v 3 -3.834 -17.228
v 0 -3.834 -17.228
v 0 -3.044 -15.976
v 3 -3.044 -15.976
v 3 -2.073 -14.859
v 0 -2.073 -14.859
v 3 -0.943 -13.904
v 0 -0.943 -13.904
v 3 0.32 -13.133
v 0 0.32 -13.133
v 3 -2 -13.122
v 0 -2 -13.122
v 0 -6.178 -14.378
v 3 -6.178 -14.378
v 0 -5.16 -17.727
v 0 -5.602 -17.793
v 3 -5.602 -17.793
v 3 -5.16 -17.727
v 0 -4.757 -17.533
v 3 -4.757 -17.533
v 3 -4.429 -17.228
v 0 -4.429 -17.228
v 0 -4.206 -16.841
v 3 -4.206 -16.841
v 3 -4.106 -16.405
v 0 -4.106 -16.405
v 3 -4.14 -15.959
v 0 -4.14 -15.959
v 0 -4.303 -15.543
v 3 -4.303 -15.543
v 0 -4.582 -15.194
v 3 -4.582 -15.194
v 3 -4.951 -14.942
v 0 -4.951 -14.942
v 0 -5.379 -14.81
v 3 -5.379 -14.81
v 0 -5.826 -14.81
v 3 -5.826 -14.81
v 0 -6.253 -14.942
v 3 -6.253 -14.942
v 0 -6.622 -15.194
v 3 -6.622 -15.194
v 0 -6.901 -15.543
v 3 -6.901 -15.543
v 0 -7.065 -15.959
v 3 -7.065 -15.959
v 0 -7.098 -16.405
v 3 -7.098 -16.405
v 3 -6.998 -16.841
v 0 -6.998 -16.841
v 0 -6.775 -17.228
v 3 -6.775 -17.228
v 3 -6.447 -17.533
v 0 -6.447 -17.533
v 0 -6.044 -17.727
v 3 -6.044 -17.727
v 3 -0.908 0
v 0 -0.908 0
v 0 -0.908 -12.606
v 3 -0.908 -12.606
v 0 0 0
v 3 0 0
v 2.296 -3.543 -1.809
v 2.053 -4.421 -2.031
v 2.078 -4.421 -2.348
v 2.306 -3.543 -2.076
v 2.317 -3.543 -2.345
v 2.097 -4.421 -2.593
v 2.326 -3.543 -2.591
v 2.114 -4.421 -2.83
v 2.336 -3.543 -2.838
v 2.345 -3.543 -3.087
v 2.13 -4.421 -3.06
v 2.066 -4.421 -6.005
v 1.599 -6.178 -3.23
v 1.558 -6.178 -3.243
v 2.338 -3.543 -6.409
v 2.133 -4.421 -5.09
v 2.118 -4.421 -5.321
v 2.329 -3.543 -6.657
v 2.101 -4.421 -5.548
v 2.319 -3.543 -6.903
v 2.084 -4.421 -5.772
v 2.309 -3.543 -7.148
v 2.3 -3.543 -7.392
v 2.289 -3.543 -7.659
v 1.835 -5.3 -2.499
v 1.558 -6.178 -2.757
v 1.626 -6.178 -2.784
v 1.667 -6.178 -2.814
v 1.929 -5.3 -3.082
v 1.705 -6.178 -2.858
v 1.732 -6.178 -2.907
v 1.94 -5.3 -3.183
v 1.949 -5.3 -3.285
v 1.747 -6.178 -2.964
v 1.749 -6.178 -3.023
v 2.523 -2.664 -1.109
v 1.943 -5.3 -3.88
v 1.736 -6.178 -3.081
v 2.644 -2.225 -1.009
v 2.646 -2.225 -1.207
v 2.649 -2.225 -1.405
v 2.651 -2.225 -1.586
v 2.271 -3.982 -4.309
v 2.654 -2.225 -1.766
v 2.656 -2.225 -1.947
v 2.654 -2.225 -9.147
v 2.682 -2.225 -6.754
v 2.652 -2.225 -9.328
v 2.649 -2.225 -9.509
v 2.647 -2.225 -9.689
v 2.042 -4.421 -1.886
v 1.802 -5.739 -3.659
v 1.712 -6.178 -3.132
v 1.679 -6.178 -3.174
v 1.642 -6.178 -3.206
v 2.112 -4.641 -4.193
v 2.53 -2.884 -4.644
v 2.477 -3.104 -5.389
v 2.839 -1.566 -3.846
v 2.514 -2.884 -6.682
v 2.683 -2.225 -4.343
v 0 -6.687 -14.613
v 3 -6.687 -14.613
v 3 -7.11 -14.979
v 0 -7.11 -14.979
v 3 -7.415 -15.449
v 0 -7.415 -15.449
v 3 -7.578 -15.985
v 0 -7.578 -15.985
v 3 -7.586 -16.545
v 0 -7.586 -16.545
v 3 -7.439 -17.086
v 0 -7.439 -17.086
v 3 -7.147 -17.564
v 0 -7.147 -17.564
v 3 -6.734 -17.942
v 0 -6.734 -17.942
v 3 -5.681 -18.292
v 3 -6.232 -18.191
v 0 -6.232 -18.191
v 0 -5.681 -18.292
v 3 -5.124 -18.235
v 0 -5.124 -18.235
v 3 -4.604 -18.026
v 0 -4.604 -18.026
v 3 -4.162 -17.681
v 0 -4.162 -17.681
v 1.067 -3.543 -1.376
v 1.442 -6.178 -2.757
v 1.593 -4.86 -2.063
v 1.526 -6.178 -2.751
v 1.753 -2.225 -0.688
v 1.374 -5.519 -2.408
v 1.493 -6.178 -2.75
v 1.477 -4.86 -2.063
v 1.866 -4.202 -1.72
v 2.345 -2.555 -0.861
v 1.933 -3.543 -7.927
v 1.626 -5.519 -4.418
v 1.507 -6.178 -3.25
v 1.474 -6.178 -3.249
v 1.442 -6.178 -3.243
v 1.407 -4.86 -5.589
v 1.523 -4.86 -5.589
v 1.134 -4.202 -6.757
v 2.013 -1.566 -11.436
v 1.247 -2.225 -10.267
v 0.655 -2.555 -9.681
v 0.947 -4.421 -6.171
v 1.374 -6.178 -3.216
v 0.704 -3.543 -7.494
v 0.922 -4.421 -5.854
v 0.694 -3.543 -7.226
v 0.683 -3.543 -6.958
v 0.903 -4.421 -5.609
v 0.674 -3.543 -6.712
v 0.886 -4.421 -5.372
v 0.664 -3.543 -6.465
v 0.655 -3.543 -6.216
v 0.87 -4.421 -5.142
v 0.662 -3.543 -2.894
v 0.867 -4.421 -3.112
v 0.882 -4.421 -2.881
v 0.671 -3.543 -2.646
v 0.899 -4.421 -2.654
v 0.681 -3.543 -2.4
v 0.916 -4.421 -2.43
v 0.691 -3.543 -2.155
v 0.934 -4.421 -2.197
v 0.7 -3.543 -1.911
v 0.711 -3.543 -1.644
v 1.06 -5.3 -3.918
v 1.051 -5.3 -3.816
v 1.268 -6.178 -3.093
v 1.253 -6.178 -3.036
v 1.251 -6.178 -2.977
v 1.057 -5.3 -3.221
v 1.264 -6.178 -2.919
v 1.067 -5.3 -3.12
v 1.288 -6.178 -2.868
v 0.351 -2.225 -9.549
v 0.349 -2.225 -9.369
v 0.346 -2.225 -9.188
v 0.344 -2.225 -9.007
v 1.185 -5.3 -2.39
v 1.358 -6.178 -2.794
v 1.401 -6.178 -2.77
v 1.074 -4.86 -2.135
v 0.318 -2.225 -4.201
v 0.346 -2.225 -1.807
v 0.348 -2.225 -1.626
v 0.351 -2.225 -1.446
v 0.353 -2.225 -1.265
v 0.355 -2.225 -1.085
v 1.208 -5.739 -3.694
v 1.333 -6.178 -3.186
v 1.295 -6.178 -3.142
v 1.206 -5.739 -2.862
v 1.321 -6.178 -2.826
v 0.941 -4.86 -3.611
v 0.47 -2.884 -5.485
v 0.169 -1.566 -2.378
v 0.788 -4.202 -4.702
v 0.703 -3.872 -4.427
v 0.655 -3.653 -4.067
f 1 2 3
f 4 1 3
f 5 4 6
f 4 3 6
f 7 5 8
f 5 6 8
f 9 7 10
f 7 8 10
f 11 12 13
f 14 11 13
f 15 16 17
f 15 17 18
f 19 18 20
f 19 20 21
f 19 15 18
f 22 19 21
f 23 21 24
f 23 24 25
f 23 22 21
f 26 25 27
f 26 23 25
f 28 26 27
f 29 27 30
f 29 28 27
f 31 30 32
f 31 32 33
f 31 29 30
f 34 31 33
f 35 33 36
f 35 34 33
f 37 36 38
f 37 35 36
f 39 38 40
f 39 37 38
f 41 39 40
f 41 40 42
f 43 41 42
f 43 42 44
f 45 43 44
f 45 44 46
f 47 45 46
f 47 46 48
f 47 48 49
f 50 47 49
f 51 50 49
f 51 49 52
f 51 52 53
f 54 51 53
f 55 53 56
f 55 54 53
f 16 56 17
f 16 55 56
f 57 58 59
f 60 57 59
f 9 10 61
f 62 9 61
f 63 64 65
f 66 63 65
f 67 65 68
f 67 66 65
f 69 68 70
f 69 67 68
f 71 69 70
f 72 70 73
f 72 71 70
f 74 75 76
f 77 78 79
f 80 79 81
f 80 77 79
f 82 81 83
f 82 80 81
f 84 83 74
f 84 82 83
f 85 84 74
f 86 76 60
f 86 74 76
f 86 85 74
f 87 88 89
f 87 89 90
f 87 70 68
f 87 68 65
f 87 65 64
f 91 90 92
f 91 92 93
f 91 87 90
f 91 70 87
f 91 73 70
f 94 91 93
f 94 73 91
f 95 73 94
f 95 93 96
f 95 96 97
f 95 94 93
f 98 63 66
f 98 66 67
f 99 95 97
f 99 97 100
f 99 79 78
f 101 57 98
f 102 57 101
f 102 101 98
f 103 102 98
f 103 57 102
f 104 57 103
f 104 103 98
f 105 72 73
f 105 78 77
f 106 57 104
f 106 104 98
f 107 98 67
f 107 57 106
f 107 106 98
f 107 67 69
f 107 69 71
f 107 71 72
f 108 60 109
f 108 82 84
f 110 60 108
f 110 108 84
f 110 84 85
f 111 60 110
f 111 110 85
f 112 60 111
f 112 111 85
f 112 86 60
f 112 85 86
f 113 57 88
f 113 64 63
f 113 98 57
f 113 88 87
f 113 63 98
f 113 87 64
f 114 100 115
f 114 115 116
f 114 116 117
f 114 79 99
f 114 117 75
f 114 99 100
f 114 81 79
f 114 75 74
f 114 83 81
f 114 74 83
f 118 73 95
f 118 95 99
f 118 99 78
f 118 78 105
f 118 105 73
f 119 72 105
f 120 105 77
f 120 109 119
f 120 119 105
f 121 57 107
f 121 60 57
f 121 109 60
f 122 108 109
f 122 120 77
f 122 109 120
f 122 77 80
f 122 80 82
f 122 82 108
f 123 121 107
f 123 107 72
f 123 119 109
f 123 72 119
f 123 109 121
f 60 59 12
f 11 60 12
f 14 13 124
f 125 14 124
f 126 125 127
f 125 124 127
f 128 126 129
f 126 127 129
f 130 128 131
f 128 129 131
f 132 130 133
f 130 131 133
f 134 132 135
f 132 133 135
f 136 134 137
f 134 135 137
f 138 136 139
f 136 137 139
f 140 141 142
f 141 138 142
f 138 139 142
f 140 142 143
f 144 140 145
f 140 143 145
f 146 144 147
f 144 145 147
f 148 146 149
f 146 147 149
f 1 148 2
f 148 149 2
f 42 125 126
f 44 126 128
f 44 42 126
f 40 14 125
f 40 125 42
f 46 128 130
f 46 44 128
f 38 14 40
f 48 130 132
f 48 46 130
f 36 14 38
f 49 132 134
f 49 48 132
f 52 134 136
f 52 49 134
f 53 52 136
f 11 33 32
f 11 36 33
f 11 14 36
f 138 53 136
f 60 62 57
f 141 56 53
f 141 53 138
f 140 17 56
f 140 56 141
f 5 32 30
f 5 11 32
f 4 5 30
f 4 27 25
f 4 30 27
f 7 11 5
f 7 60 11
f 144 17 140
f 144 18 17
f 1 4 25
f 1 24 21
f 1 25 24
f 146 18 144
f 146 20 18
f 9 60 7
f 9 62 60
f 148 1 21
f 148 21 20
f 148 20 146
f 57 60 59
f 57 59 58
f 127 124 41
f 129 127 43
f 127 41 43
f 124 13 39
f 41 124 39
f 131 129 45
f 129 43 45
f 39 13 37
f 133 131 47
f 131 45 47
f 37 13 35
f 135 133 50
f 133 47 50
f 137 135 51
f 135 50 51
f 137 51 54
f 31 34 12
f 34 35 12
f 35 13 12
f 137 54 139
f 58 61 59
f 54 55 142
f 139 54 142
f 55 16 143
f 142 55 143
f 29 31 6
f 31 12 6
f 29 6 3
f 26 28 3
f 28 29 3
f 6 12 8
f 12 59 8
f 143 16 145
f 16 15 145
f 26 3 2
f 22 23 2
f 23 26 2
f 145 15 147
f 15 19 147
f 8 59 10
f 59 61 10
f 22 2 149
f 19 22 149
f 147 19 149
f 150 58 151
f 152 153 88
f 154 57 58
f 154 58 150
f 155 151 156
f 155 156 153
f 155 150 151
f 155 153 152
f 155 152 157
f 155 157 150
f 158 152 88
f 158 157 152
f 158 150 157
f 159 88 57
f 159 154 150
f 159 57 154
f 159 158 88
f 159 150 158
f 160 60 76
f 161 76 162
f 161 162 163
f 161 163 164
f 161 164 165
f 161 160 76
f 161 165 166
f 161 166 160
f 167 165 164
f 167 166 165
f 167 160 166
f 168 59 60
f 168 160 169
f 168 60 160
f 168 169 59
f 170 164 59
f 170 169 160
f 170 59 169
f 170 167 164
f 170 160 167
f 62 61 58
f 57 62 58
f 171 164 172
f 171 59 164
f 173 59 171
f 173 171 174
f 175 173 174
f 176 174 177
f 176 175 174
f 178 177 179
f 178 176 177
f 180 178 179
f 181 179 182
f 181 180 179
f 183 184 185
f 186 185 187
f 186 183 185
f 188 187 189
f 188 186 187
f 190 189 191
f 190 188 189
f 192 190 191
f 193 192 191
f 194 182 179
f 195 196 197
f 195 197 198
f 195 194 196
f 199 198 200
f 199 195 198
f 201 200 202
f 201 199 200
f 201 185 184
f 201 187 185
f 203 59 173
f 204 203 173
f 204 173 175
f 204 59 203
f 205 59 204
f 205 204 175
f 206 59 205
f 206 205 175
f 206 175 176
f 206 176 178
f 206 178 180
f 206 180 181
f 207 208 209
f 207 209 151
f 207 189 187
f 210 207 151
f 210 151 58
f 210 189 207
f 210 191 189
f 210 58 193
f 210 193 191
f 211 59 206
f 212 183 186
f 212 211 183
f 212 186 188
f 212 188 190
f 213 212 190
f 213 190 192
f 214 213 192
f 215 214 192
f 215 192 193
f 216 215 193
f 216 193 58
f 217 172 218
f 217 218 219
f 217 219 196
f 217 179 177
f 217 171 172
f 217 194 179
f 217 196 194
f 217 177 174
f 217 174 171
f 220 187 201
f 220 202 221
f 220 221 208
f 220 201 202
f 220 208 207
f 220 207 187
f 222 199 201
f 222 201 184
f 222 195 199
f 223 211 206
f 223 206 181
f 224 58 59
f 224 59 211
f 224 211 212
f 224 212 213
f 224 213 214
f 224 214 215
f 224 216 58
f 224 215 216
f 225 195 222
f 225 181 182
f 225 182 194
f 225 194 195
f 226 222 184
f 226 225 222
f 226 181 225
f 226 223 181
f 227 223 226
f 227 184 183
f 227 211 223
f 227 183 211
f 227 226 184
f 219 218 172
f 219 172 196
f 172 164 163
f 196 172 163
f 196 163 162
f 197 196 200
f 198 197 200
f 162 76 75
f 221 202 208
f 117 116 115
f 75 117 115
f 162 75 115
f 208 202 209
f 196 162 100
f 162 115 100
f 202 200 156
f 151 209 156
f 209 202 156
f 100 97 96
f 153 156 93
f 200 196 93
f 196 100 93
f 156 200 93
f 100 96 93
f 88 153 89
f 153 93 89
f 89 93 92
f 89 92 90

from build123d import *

# Parameters (mm, degrees)
SKETCH8_R           = 2
SKETCH8_R_2         = 1.5
BOSS_EXTRUDE3_DEPTH = 3


with BuildPart() as part:
    # Sketch8 → Boss-Extrude3 (new body)
    # profile 1 of 2: a face of its own
    with BuildSketch(Plane(origin=(0, 0, 0), x_dir=(0, 0, -1), z_dir=(1, 0, 0))):
        with BuildLine():
            Line((13.132863069, 0.320027848), (0, 0))
            Line((0, 0), (0, -0.907670556))
            Line((0, -0.907670556), (7.174444166, -0.907670556))
            Line((7.174444166, -0.907670556), (12.605766771, -0.907670556))
            Line((12.605766771, -0.907670556), (13.12184584, -1.999779955))
            Line((13.12184584, -1.999779955), (14.377901927, -6.177963459))
            ThreePointArc((14.377901927, -6.177963459), (15.022692005, -4.057588727), (17.227616297, -3.83386543))
            ThreePointArc((17.227616297, -3.83386543), (14.859483295, -2.073108487), (13.132863069, 0.320027848))
        make_face()
    # profile 2 of 2: a face of its own
    with BuildSketch(Plane(origin=(0, 0, 0), x_dir=(0, 0, -1), z_dir=(1, 0, 0))):
        with Locations((16.293226017, -5.602173889)):
            Circle(SKETCH8_R)
        with Locations((16.293226017, -5.602173889)):
            Circle(SKETCH8_R_2, mode=Mode.SUBTRACT)
    extrude(amount=BOSS_EXTRUDE3_DEPTH)


with BuildPart() as body_2:
    # Loft2: read off the stored shape, not the designer's step
    # Loft2: loft between two sections, ruled curve by curve
    loft2_from = [
        Edge.make_bspline([(1.442119938, -6.177963459, -2.756792479), (1.460889093, -6.177963459, -2.752325677), (1.480444547, -6.177963459, -2.750092276), (1.519555453, -6.177963459, -2.750092276), (1.539110907, -6.177963459, -2.752325677), (1.557880062, -6.177963459, -2.756792479)], [0, 0, 0, 0, 0.5, 0.5, 1, 1, 1, 1], 3),
        Edge.make_bspline([(1.557880062, -6.177963459, -2.756792479), (1.597313328, -6.177963459, -2.766177056), (1.643612327, -6.177963459, -2.787589475), (1.721437888, -6.177963459, -2.870740595), (1.75, -6.177963459, -2.934171465), (1.75, -6.177963459, -3.065828535), (1.721437888, -6.177963459, -3.129259405), (1.643612327, -6.177963459, -3.212410525), (1.597313328, -6.177963459, -3.233822944), (1.557880062, -6.177963459, -3.243207521)], [0, 0, 0, 0, 0.25, 0.25, 0.5, 0.5, 0.75, 0.75, 1, 1, 1, 1], 3),
        Edge.make_bspline([(1.442119938, -6.177963459, -3.243207521), (1.402686672, -6.177963459, -3.233822944), (1.356387673, -6.177963459, -3.212410525), (1.278562112, -6.177963459, -3.129259405), (1.25, -6.177963459, -3.065828535), (1.25, -6.177963459, -2.934171465), (1.278562112, -6.177963459, -2.870740595), (1.356387673, -6.177963459, -2.787589475), (1.402686672, -6.177963459, -2.766177056), (1.442119938, -6.177963459, -2.756792479)], [0, 0, 0, 0, 0.25, 0.25, 0.5, 0.5, 0.75, 0.75, 1, 1, 1, 1], 3),
        Edge.make_bspline([(1.557880062, -6.177963459, -3.243207521), (1.539110907, -6.177963459, -3.247674323), (1.519555453, -6.177963459, -3.249907724), (1.480444547, -6.177963459, -3.249907724), (1.460889093, -6.177963459, -3.247674323), (1.442119938, -6.177963459, -3.243207521)], [0, 0, 0, 0, 0.5, 0.5, 1, 1, 1, 1], 3),
    ]
    loft2_to = [
        Edge.make_bspline([(0, -0.907670556, 0), (0.5, -0.907670556, 0), (1, -0.907670556, 0), (2, -0.907670556, 0), (2.5, -0.907670556, 0), (3, -0.907670556, 0)], [0, 0, 0, 0, 0.5, 0.5, 1, 1, 1, 1], 3),
        Edge.make_bspline([(3, -0.907670556, 0), (3, -0.907670556, -1.050480564), (3, -0.907670556, -2.100961129), (3, -0.907670556, -4.201922257), (3, -0.907670556, -5.252402821), (3, -0.907670556, -7.35336395), (3, -0.907670556, -8.403844514), (3, -0.907670556, -10.504805643), (3, -0.907670556, -11.555286207), (3, -0.907670556, -12.605766771)], [0, 0, 0, 0, 0.25, 0.25, 0.5, 0.5, 0.75, 0.75, 1, 1, 1, 1], 3),
        Edge.make_bspline([(0, -0.907670556, -12.605766771), (0, -0.907670556, -11.555286207), (0, -0.907670556, -10.504805643), (0, -0.907670556, -8.403844514), (0, -0.907670556, -7.35336395), (0, -0.907670556, -5.252402821), (0, -0.907670556, -4.201922257), (0, -0.907670556, -2.100961129), (0, -0.907670556, -1.050480564), (0, -0.907670556, 0)], [0, 0, 0, 0, 0.25, 0.25, 0.5, 0.5, 0.75, 0.75, 1, 1, 1, 1], 3),
        Edge.make_bspline([(3, -0.907670556, -12.605766771), (2.5, -0.907670556, -12.605766771), (2, -0.907670556, -12.605766771), (1, -0.907670556, -12.605766771), (0.5, -0.907670556, -12.605766771), (0, -0.907670556, -12.605766771)], [0, 0, 0, 0, 0.5, 0.5, 1, 1, 1, 1], 3),
    ]
    loft2 = Solid(Shell([*[Face.make_surface_from_curves(loft2_from[k], loft2_to[k]) for k in range(4)], Face(Wire(loft2_from)), Face(Wire(loft2_to))]))
    add(loft2)


solid = Compound([part.part, body_2.part])
